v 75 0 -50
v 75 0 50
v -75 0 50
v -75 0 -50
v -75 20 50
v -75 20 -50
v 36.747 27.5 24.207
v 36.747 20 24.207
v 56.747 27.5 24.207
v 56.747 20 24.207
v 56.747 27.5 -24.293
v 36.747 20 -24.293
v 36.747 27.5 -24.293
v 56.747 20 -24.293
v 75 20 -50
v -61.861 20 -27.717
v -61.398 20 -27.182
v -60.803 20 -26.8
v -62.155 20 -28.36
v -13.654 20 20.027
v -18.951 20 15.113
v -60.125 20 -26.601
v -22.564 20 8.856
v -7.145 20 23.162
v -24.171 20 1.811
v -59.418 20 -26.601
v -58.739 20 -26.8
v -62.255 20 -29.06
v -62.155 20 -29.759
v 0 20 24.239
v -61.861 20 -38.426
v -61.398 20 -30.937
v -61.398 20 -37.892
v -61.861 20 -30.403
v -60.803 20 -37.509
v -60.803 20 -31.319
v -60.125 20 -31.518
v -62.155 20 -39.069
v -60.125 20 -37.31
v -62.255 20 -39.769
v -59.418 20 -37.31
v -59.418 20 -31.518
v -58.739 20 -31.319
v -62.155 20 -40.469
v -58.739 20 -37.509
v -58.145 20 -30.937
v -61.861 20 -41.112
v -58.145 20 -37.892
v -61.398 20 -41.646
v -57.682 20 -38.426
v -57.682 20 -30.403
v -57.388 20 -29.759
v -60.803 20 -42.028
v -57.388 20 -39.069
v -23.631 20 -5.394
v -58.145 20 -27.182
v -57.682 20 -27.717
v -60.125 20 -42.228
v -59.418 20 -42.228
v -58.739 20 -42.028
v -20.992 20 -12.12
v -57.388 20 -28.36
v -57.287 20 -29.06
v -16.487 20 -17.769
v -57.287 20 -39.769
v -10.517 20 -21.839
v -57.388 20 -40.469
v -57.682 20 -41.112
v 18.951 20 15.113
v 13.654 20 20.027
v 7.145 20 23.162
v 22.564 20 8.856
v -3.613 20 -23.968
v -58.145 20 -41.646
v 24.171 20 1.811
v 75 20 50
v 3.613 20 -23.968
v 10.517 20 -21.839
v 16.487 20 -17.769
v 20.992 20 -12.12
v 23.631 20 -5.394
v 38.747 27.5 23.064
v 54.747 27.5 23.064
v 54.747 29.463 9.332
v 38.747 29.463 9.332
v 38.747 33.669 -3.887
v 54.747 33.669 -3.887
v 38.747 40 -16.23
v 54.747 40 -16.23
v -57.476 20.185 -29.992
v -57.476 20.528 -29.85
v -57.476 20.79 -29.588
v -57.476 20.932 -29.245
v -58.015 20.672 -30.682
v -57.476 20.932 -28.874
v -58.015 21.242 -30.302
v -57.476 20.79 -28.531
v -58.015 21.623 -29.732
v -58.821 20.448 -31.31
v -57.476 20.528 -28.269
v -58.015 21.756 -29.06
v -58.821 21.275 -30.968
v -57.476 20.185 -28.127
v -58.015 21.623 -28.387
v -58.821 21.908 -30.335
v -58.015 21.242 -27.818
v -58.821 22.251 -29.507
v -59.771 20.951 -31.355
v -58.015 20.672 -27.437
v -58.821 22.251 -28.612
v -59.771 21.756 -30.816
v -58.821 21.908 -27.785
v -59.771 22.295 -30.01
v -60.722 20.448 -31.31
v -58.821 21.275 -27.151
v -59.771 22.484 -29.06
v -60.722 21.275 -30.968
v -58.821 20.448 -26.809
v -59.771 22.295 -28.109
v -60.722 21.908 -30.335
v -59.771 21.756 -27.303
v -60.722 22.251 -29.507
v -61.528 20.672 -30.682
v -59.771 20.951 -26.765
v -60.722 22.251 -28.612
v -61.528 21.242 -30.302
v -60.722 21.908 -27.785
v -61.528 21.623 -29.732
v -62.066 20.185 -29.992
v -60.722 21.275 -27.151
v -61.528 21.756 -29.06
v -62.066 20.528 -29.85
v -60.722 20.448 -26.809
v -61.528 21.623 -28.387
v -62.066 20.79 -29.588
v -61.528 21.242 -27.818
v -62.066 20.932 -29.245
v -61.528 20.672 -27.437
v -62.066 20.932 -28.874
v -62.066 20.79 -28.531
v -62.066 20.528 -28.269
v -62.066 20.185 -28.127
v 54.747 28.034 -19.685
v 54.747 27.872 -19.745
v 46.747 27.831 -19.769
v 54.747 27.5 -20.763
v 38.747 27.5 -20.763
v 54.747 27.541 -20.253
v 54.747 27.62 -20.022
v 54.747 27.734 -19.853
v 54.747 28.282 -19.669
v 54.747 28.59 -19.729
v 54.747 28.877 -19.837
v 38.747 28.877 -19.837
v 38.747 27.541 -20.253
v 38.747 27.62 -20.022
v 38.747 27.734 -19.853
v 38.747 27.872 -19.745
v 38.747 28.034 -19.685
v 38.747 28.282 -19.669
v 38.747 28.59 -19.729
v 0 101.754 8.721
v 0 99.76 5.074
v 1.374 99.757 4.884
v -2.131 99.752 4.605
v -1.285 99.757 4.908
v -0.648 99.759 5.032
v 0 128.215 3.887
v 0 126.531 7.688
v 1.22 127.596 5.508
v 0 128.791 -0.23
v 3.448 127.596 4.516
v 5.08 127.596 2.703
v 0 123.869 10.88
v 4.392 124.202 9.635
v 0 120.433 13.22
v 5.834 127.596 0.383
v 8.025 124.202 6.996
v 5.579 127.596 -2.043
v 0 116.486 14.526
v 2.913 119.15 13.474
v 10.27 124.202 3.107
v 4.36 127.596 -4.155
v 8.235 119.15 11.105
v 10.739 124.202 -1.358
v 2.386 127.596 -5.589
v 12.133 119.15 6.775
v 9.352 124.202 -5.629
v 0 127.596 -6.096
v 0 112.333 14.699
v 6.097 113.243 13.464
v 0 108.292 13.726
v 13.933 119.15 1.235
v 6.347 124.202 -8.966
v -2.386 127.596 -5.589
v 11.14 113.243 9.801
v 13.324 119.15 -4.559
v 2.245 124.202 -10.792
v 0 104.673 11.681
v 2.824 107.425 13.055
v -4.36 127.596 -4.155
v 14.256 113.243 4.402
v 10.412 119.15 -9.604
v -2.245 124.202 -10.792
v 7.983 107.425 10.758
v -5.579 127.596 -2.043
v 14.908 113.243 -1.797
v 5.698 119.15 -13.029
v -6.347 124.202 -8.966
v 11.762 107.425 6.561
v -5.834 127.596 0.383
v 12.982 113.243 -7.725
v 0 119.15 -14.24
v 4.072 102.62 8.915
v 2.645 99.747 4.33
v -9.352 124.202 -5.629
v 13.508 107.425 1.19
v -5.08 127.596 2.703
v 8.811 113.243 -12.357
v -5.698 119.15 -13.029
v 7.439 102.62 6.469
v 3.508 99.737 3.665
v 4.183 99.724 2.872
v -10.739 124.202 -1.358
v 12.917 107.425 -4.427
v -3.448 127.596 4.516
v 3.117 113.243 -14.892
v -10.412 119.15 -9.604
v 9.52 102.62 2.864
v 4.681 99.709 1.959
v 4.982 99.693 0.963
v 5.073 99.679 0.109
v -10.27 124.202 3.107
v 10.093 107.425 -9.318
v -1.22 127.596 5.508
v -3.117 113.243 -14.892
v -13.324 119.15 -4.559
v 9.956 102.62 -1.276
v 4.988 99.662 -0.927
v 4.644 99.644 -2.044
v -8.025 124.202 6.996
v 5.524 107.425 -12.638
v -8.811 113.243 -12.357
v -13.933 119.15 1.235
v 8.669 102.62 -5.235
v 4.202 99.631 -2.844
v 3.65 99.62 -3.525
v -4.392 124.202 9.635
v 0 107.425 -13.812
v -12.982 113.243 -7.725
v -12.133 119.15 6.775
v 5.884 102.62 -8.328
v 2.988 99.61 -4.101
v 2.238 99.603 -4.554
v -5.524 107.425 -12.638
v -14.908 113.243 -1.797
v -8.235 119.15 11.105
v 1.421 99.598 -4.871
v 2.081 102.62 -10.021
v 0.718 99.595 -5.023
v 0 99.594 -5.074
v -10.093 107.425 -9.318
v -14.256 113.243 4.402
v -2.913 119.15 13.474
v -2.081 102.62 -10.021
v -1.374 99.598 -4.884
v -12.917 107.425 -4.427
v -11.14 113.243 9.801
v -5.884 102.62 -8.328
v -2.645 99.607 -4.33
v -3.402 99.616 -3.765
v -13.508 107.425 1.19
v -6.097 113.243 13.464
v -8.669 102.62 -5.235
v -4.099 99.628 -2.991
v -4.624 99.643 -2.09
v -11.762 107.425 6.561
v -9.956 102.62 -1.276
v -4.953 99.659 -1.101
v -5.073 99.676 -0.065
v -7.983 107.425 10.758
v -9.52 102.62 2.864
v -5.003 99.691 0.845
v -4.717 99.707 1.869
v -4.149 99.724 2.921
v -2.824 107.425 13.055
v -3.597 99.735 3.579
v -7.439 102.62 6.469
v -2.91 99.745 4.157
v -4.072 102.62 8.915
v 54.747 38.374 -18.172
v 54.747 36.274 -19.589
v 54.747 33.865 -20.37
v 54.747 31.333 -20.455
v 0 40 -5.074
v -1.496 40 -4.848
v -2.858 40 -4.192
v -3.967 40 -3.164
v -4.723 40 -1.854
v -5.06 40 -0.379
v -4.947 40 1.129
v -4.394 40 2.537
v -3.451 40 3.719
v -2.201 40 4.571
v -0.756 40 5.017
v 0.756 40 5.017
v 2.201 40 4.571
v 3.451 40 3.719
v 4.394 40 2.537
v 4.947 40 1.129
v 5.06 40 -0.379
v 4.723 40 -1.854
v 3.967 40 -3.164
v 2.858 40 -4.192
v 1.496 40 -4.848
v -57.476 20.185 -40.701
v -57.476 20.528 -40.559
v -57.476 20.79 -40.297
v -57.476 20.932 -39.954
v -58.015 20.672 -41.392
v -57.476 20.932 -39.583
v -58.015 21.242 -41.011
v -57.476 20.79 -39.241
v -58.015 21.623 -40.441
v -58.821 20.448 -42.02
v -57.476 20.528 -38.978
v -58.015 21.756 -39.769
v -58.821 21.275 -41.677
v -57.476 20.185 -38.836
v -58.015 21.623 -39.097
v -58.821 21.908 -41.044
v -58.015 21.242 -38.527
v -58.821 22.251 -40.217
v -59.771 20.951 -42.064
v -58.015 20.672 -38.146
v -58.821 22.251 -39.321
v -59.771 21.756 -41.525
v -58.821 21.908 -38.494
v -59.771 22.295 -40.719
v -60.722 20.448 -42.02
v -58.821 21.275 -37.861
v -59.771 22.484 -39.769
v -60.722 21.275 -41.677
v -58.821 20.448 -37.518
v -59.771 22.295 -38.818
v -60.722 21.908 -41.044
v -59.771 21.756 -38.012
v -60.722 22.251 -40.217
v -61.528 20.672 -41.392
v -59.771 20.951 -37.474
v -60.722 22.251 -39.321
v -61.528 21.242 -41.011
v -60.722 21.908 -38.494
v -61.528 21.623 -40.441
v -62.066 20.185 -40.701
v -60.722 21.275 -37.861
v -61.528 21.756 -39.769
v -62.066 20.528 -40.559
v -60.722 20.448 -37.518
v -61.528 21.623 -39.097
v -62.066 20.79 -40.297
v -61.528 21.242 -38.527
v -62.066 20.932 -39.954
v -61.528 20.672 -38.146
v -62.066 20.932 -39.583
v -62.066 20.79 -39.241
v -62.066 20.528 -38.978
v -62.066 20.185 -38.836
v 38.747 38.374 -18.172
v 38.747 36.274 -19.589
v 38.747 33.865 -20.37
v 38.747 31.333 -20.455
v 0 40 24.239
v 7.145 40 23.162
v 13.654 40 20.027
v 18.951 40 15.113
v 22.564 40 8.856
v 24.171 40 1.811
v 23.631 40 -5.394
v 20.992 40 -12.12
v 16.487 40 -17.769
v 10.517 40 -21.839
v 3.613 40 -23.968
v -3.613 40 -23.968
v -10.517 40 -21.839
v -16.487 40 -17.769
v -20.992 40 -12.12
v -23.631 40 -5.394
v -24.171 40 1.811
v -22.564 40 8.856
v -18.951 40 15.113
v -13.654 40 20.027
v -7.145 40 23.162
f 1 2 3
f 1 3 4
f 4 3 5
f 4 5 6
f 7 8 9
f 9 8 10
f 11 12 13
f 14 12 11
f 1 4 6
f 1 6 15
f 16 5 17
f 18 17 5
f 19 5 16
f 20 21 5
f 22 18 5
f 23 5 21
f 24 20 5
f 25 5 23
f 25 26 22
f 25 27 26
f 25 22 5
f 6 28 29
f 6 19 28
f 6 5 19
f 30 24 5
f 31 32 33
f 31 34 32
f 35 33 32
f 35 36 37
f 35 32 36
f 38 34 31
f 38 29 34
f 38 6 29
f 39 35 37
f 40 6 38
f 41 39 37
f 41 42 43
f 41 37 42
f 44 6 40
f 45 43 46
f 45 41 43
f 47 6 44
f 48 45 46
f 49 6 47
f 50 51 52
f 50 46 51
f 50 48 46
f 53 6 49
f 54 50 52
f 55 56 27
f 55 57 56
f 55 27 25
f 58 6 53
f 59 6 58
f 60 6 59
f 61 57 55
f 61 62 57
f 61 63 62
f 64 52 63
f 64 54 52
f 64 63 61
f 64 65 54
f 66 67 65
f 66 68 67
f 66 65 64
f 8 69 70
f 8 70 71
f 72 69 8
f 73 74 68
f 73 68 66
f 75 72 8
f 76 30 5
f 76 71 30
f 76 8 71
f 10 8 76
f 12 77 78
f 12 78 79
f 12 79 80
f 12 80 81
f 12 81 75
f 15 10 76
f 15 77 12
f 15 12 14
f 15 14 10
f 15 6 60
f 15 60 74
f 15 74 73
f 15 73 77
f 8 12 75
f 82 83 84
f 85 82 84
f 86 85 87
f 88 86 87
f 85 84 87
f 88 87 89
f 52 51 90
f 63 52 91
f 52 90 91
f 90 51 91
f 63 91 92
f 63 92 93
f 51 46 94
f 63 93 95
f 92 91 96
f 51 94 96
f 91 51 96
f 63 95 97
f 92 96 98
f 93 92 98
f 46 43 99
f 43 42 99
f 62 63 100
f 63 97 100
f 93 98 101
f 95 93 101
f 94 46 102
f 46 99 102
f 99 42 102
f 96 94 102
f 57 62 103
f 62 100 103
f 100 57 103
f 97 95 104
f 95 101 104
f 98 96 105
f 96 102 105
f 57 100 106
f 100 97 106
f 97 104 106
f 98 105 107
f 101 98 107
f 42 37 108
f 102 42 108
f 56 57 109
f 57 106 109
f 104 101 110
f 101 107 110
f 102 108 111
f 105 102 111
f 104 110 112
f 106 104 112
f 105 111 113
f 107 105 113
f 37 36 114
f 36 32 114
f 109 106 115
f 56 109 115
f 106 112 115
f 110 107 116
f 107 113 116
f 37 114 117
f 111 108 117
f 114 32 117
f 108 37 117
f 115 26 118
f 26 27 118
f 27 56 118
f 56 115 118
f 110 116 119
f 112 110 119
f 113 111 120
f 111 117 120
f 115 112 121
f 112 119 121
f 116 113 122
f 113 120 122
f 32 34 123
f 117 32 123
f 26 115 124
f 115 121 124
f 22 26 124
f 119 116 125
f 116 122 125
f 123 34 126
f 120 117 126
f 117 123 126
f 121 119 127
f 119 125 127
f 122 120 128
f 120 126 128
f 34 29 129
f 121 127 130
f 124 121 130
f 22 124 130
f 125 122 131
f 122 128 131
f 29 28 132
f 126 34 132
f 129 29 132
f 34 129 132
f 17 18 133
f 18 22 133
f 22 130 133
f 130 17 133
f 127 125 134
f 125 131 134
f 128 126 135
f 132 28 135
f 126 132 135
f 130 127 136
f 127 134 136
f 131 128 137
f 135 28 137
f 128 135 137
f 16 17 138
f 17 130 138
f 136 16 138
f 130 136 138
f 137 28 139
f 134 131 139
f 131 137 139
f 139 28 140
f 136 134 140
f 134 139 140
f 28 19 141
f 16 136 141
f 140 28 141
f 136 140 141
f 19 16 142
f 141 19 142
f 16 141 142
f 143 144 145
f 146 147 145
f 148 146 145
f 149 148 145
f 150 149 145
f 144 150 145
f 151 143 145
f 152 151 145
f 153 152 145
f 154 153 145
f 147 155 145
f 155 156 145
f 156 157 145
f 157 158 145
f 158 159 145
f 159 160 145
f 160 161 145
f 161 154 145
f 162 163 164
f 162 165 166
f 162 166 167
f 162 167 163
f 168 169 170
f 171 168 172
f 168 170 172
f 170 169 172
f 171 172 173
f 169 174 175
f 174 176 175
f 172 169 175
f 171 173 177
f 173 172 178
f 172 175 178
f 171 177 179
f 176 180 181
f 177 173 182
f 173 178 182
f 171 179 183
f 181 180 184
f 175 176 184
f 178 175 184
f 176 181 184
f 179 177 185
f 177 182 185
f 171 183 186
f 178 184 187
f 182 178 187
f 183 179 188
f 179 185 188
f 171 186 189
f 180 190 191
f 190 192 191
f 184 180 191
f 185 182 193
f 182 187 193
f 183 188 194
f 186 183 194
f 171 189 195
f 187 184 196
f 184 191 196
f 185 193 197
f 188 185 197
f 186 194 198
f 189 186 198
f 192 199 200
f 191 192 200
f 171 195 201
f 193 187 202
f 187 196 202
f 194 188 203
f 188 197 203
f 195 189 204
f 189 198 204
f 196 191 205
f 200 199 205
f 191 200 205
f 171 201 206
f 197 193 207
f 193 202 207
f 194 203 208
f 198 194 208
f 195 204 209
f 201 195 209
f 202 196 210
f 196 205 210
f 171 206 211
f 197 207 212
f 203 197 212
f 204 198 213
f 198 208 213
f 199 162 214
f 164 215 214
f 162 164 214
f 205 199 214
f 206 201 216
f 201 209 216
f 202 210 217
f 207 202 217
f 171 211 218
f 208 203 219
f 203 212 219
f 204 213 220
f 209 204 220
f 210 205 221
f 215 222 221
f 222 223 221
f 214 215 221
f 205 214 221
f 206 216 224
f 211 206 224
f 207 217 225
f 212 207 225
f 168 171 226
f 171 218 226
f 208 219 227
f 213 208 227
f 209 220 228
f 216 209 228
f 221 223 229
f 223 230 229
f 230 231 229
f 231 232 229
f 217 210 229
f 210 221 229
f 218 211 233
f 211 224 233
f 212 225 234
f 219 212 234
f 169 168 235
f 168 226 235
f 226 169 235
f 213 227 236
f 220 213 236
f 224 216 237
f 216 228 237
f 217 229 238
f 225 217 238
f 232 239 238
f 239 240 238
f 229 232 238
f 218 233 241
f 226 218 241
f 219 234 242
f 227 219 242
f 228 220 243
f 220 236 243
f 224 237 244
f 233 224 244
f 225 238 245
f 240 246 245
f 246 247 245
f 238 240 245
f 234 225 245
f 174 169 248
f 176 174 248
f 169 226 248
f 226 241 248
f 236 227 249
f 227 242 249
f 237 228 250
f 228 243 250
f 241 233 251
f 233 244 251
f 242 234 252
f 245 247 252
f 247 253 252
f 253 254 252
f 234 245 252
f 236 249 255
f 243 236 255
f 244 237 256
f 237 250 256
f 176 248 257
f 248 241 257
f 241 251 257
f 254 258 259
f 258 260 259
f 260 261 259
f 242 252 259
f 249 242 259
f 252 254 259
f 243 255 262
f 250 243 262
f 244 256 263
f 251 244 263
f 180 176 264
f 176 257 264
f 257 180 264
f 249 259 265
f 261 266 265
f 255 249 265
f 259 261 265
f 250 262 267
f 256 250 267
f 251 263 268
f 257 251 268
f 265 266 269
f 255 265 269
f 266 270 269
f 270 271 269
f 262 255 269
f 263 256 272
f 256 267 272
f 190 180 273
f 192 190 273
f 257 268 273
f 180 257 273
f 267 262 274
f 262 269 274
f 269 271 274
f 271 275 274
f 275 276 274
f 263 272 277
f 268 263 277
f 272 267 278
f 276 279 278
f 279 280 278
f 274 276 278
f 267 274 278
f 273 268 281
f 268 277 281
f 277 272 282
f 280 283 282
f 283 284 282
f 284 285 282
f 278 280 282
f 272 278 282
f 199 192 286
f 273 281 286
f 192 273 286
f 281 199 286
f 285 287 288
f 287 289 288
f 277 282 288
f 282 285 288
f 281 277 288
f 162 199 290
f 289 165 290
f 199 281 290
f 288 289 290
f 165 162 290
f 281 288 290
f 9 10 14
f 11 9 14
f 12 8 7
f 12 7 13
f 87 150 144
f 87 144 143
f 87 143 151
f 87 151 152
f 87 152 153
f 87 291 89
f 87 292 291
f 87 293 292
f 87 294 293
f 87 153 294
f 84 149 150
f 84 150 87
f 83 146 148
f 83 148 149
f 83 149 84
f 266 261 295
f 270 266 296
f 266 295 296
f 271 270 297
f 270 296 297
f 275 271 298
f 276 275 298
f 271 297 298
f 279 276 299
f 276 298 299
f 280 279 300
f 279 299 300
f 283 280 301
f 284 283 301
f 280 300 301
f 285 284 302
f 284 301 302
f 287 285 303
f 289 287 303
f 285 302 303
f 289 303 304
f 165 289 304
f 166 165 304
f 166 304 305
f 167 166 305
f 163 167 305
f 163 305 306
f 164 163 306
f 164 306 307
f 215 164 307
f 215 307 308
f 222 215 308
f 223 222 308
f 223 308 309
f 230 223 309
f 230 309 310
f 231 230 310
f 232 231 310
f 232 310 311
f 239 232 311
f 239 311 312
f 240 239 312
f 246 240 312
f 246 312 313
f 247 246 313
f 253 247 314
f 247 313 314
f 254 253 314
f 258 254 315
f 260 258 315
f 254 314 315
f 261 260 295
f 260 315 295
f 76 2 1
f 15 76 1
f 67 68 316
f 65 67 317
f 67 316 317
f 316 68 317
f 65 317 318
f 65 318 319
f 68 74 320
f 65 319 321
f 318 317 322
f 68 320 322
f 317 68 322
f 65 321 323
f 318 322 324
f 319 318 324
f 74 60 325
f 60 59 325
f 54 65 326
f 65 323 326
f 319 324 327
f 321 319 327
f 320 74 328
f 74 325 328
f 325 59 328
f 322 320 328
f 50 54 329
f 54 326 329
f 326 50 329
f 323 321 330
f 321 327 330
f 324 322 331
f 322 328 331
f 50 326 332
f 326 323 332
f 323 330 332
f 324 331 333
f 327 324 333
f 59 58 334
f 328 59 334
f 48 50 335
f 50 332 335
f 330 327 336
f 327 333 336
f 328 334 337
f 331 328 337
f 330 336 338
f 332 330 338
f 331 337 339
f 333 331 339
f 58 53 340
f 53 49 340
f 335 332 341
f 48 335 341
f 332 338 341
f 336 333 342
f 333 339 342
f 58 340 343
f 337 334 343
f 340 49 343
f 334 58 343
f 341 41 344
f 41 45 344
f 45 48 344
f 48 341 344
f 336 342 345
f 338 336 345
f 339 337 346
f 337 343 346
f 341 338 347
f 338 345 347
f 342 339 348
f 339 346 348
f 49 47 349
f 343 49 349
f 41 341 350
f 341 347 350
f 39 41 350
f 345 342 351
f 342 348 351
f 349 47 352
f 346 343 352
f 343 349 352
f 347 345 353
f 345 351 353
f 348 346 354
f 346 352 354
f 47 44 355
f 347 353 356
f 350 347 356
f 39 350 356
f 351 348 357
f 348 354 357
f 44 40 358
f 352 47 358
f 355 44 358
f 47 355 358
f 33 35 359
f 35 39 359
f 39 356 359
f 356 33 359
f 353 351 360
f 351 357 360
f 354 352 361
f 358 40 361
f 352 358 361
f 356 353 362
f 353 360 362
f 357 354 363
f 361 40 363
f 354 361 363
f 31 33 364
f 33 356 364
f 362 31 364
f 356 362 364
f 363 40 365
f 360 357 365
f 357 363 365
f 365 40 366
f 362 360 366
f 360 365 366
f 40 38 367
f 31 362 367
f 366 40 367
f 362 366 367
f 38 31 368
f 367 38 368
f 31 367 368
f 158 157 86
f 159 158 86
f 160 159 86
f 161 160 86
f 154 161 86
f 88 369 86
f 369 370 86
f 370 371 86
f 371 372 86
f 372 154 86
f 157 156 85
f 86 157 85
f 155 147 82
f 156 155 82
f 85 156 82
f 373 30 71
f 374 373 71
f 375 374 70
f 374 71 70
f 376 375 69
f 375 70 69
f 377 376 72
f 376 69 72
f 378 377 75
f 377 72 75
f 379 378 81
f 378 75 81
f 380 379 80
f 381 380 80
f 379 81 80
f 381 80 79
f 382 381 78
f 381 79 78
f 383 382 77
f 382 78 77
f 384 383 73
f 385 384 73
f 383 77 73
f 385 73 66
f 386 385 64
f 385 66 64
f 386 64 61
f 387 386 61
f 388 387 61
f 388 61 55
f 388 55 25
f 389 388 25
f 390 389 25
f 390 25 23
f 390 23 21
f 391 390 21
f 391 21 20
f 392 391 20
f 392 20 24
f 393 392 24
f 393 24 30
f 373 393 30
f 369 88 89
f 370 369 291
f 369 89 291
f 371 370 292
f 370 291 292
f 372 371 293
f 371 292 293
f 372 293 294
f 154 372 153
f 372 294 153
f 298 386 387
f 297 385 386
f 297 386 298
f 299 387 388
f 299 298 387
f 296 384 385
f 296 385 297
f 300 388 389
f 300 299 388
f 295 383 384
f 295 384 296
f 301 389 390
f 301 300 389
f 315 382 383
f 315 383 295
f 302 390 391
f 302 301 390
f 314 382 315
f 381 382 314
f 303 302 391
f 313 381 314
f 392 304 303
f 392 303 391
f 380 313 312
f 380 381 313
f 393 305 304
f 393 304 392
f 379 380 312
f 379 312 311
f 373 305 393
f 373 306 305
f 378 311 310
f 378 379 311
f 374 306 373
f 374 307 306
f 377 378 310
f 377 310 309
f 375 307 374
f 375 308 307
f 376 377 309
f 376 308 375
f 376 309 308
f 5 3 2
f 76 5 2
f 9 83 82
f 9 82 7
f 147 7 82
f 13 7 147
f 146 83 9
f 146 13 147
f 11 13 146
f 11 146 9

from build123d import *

# Parameters (mm, degrees)
SKETCH1_W            = 150
SKETCH1_H            = 100
BOSS_EXTRUDE1_DEPTH  = 20
SKETCH2_R            = 24.239154651
BOSS_EXTRUDE2_DEPTH  = 40
SKETCH3_R            = 5.073901121
BOSS_EXTRUDE3_DEPTH  = 100
SKETCH17_W           = 20
SKETCH17_H           = 48.5
BOSS_EXTRUDE14_DEPTH = 7.5
BOSS_EXTRUDE15_START = -2
BOSS_EXTRUDE15_DEPTH = 16
FILLET5_START        = 38.747344483
FILLET5_DEPTH        = 16


with BuildPart() as part:
    # Sketch1 → Boss-Extrude1 (new body)
    with BuildSketch(Plane(origin=(0, 0, 0), x_dir=(1, 0, 0), z_dir=(0, 1, 0))):
        Rectangle(SKETCH1_W, SKETCH1_H)
    extrude(amount=BOSS_EXTRUDE1_DEPTH)

    # Sketch2 → Boss-Extrude2 (add)
    with BuildSketch(Plane(origin=(0, 0, 0), x_dir=(1, 0, 0), z_dir=(0, 1, 0))):
        with Locations(Location((0, 0, 0), (0, 0, 270))):
            Circle(SKETCH2_R)
    extrude(amount=BOSS_EXTRUDE2_DEPTH)

    # Sketch3 → Boss-Extrude3 (add)
    with BuildSketch(Plane(origin=(0, 0, 0), x_dir=(1, 0, 0), z_dir=(0, 1, 0))):
        with Locations(Location((0, 0, 0), (0, 0, 90))):
            Circle(SKETCH3_R)
    extrude(amount=BOSS_EXTRUDE3_DEPTH)

    # Sketch5 → Revolve2 (revolve)
    with BuildSketch(Plane(origin=(0, 0, 0), x_dir=(0, 0, -1), z_dir=(1, 0, 0))):
        with BuildLine():
            Line((0.229753848, 98.790742156), (0.229753848, 128.790742156))
            ThreePointArc((0.229753848, 128.790742156), (-14.770246152, 113.790742156), (0.229753848, 98.790742156))
        make_face()
    revolve(axis=Axis((0, 98.790742156, -0.229753848), (0, 1, 0)))

    # Sketch17 → Boss-Extrude14 (add)
    with BuildSketch(Plane(origin=(0, 20, 0), x_dir=(1, 0, 0), z_dir=(0, 1, 0))):
        with Locations((46.747344483, 0.04322355)):
            Rectangle(SKETCH17_W, SKETCH17_H)
    extrude(amount=BOSS_EXTRUDE14_DEPTH)

    # Sketch21 → Boss-Extrude15 (add)
    with BuildSketch(Plane(origin=(56.747344483, 0, 0), x_dir=(0, 0, -1), z_dir=(1, 0, 0)).offset(BOSS_EXTRUDE15_START)):
        with BuildLine():
            Line((19.134328626, 27.5), (-23.063699683, 27.5))
            ThreePointArc((-23.063699683, 27.5), (-2.634761018, 31.291523365), (16.230010888, 40))
            ThreePointArc((16.230010888, 40), (20.271004522, 34.351503898), (19.134328626, 27.5))
        make_face()
    extrude(amount=-BOSS_EXTRUDE15_DEPTH)

    # Fillet5: read off the stored shape, not the designer's step
    # Fillet5 outline → Fillet5 (add)
    with BuildSketch(Plane.YZ.offset(FILLET5_START)):
        with BuildLine():
            Line((27.5, -19.134328626), (27.5, -20.763165982))
            add(Edge.make_bspline(
                [(27.5, -20.763165982), (27.5, -20.531845888), (27.5, -20.300525794), (27.623544112, -19.810870378), (27.937534857, -19.585621938), (28.467988806, -19.663458549), (28.675738966, -19.755036772), (28.876983932, -19.836946184)],
                knots=[0, 0, 0, 0, 0, 0, 0.5, 0.5, 1, 1, 1, 1, 1, 1], degree=5))
            ThreePointArc((28.876983932, -19.836946184), (28.173502588, -19.515013461), (27.5, -19.134328626))
        make_face()
    extrude(amount=FILLET5_DEPTH)

    # Sketch24 → Revolve3 (revolve)
    with BuildSketch(Plane(origin=(0, 20, 0), x_dir=(1, 0, 0), z_dir=(0, 1, 0))):
        with BuildLine():
            Line((-62.255471135, 39.768833527), (-57.287341541, 39.768833527))
            ThreePointArc((-57.287341541, 39.768833527), (-59.771406338, 42.252898324), (-62.255471135, 39.768833527))
        make_face()
    revolve(axis=Axis((-62.255471135, 20, -39.768833527), (1, 0, 0)))

    # Sketch25 → Revolve4 (revolve)
    with BuildSketch(Plane(origin=(0, 20, 0), x_dir=(1, 0, 0), z_dir=(0, 1, 0))):
        with BuildLine():
            Line((-62.255471135, 29.059615512), (-57.287341541, 29.059615512))
            ThreePointArc((-57.287341541, 29.059615512), (-59.771406338, 31.543680309), (-62.255471135, 29.059615512))
        make_face()
    revolve(axis=Axis((-62.255471135, 20, -29.059615512), (1, 0, 0)))


solid = part.part
